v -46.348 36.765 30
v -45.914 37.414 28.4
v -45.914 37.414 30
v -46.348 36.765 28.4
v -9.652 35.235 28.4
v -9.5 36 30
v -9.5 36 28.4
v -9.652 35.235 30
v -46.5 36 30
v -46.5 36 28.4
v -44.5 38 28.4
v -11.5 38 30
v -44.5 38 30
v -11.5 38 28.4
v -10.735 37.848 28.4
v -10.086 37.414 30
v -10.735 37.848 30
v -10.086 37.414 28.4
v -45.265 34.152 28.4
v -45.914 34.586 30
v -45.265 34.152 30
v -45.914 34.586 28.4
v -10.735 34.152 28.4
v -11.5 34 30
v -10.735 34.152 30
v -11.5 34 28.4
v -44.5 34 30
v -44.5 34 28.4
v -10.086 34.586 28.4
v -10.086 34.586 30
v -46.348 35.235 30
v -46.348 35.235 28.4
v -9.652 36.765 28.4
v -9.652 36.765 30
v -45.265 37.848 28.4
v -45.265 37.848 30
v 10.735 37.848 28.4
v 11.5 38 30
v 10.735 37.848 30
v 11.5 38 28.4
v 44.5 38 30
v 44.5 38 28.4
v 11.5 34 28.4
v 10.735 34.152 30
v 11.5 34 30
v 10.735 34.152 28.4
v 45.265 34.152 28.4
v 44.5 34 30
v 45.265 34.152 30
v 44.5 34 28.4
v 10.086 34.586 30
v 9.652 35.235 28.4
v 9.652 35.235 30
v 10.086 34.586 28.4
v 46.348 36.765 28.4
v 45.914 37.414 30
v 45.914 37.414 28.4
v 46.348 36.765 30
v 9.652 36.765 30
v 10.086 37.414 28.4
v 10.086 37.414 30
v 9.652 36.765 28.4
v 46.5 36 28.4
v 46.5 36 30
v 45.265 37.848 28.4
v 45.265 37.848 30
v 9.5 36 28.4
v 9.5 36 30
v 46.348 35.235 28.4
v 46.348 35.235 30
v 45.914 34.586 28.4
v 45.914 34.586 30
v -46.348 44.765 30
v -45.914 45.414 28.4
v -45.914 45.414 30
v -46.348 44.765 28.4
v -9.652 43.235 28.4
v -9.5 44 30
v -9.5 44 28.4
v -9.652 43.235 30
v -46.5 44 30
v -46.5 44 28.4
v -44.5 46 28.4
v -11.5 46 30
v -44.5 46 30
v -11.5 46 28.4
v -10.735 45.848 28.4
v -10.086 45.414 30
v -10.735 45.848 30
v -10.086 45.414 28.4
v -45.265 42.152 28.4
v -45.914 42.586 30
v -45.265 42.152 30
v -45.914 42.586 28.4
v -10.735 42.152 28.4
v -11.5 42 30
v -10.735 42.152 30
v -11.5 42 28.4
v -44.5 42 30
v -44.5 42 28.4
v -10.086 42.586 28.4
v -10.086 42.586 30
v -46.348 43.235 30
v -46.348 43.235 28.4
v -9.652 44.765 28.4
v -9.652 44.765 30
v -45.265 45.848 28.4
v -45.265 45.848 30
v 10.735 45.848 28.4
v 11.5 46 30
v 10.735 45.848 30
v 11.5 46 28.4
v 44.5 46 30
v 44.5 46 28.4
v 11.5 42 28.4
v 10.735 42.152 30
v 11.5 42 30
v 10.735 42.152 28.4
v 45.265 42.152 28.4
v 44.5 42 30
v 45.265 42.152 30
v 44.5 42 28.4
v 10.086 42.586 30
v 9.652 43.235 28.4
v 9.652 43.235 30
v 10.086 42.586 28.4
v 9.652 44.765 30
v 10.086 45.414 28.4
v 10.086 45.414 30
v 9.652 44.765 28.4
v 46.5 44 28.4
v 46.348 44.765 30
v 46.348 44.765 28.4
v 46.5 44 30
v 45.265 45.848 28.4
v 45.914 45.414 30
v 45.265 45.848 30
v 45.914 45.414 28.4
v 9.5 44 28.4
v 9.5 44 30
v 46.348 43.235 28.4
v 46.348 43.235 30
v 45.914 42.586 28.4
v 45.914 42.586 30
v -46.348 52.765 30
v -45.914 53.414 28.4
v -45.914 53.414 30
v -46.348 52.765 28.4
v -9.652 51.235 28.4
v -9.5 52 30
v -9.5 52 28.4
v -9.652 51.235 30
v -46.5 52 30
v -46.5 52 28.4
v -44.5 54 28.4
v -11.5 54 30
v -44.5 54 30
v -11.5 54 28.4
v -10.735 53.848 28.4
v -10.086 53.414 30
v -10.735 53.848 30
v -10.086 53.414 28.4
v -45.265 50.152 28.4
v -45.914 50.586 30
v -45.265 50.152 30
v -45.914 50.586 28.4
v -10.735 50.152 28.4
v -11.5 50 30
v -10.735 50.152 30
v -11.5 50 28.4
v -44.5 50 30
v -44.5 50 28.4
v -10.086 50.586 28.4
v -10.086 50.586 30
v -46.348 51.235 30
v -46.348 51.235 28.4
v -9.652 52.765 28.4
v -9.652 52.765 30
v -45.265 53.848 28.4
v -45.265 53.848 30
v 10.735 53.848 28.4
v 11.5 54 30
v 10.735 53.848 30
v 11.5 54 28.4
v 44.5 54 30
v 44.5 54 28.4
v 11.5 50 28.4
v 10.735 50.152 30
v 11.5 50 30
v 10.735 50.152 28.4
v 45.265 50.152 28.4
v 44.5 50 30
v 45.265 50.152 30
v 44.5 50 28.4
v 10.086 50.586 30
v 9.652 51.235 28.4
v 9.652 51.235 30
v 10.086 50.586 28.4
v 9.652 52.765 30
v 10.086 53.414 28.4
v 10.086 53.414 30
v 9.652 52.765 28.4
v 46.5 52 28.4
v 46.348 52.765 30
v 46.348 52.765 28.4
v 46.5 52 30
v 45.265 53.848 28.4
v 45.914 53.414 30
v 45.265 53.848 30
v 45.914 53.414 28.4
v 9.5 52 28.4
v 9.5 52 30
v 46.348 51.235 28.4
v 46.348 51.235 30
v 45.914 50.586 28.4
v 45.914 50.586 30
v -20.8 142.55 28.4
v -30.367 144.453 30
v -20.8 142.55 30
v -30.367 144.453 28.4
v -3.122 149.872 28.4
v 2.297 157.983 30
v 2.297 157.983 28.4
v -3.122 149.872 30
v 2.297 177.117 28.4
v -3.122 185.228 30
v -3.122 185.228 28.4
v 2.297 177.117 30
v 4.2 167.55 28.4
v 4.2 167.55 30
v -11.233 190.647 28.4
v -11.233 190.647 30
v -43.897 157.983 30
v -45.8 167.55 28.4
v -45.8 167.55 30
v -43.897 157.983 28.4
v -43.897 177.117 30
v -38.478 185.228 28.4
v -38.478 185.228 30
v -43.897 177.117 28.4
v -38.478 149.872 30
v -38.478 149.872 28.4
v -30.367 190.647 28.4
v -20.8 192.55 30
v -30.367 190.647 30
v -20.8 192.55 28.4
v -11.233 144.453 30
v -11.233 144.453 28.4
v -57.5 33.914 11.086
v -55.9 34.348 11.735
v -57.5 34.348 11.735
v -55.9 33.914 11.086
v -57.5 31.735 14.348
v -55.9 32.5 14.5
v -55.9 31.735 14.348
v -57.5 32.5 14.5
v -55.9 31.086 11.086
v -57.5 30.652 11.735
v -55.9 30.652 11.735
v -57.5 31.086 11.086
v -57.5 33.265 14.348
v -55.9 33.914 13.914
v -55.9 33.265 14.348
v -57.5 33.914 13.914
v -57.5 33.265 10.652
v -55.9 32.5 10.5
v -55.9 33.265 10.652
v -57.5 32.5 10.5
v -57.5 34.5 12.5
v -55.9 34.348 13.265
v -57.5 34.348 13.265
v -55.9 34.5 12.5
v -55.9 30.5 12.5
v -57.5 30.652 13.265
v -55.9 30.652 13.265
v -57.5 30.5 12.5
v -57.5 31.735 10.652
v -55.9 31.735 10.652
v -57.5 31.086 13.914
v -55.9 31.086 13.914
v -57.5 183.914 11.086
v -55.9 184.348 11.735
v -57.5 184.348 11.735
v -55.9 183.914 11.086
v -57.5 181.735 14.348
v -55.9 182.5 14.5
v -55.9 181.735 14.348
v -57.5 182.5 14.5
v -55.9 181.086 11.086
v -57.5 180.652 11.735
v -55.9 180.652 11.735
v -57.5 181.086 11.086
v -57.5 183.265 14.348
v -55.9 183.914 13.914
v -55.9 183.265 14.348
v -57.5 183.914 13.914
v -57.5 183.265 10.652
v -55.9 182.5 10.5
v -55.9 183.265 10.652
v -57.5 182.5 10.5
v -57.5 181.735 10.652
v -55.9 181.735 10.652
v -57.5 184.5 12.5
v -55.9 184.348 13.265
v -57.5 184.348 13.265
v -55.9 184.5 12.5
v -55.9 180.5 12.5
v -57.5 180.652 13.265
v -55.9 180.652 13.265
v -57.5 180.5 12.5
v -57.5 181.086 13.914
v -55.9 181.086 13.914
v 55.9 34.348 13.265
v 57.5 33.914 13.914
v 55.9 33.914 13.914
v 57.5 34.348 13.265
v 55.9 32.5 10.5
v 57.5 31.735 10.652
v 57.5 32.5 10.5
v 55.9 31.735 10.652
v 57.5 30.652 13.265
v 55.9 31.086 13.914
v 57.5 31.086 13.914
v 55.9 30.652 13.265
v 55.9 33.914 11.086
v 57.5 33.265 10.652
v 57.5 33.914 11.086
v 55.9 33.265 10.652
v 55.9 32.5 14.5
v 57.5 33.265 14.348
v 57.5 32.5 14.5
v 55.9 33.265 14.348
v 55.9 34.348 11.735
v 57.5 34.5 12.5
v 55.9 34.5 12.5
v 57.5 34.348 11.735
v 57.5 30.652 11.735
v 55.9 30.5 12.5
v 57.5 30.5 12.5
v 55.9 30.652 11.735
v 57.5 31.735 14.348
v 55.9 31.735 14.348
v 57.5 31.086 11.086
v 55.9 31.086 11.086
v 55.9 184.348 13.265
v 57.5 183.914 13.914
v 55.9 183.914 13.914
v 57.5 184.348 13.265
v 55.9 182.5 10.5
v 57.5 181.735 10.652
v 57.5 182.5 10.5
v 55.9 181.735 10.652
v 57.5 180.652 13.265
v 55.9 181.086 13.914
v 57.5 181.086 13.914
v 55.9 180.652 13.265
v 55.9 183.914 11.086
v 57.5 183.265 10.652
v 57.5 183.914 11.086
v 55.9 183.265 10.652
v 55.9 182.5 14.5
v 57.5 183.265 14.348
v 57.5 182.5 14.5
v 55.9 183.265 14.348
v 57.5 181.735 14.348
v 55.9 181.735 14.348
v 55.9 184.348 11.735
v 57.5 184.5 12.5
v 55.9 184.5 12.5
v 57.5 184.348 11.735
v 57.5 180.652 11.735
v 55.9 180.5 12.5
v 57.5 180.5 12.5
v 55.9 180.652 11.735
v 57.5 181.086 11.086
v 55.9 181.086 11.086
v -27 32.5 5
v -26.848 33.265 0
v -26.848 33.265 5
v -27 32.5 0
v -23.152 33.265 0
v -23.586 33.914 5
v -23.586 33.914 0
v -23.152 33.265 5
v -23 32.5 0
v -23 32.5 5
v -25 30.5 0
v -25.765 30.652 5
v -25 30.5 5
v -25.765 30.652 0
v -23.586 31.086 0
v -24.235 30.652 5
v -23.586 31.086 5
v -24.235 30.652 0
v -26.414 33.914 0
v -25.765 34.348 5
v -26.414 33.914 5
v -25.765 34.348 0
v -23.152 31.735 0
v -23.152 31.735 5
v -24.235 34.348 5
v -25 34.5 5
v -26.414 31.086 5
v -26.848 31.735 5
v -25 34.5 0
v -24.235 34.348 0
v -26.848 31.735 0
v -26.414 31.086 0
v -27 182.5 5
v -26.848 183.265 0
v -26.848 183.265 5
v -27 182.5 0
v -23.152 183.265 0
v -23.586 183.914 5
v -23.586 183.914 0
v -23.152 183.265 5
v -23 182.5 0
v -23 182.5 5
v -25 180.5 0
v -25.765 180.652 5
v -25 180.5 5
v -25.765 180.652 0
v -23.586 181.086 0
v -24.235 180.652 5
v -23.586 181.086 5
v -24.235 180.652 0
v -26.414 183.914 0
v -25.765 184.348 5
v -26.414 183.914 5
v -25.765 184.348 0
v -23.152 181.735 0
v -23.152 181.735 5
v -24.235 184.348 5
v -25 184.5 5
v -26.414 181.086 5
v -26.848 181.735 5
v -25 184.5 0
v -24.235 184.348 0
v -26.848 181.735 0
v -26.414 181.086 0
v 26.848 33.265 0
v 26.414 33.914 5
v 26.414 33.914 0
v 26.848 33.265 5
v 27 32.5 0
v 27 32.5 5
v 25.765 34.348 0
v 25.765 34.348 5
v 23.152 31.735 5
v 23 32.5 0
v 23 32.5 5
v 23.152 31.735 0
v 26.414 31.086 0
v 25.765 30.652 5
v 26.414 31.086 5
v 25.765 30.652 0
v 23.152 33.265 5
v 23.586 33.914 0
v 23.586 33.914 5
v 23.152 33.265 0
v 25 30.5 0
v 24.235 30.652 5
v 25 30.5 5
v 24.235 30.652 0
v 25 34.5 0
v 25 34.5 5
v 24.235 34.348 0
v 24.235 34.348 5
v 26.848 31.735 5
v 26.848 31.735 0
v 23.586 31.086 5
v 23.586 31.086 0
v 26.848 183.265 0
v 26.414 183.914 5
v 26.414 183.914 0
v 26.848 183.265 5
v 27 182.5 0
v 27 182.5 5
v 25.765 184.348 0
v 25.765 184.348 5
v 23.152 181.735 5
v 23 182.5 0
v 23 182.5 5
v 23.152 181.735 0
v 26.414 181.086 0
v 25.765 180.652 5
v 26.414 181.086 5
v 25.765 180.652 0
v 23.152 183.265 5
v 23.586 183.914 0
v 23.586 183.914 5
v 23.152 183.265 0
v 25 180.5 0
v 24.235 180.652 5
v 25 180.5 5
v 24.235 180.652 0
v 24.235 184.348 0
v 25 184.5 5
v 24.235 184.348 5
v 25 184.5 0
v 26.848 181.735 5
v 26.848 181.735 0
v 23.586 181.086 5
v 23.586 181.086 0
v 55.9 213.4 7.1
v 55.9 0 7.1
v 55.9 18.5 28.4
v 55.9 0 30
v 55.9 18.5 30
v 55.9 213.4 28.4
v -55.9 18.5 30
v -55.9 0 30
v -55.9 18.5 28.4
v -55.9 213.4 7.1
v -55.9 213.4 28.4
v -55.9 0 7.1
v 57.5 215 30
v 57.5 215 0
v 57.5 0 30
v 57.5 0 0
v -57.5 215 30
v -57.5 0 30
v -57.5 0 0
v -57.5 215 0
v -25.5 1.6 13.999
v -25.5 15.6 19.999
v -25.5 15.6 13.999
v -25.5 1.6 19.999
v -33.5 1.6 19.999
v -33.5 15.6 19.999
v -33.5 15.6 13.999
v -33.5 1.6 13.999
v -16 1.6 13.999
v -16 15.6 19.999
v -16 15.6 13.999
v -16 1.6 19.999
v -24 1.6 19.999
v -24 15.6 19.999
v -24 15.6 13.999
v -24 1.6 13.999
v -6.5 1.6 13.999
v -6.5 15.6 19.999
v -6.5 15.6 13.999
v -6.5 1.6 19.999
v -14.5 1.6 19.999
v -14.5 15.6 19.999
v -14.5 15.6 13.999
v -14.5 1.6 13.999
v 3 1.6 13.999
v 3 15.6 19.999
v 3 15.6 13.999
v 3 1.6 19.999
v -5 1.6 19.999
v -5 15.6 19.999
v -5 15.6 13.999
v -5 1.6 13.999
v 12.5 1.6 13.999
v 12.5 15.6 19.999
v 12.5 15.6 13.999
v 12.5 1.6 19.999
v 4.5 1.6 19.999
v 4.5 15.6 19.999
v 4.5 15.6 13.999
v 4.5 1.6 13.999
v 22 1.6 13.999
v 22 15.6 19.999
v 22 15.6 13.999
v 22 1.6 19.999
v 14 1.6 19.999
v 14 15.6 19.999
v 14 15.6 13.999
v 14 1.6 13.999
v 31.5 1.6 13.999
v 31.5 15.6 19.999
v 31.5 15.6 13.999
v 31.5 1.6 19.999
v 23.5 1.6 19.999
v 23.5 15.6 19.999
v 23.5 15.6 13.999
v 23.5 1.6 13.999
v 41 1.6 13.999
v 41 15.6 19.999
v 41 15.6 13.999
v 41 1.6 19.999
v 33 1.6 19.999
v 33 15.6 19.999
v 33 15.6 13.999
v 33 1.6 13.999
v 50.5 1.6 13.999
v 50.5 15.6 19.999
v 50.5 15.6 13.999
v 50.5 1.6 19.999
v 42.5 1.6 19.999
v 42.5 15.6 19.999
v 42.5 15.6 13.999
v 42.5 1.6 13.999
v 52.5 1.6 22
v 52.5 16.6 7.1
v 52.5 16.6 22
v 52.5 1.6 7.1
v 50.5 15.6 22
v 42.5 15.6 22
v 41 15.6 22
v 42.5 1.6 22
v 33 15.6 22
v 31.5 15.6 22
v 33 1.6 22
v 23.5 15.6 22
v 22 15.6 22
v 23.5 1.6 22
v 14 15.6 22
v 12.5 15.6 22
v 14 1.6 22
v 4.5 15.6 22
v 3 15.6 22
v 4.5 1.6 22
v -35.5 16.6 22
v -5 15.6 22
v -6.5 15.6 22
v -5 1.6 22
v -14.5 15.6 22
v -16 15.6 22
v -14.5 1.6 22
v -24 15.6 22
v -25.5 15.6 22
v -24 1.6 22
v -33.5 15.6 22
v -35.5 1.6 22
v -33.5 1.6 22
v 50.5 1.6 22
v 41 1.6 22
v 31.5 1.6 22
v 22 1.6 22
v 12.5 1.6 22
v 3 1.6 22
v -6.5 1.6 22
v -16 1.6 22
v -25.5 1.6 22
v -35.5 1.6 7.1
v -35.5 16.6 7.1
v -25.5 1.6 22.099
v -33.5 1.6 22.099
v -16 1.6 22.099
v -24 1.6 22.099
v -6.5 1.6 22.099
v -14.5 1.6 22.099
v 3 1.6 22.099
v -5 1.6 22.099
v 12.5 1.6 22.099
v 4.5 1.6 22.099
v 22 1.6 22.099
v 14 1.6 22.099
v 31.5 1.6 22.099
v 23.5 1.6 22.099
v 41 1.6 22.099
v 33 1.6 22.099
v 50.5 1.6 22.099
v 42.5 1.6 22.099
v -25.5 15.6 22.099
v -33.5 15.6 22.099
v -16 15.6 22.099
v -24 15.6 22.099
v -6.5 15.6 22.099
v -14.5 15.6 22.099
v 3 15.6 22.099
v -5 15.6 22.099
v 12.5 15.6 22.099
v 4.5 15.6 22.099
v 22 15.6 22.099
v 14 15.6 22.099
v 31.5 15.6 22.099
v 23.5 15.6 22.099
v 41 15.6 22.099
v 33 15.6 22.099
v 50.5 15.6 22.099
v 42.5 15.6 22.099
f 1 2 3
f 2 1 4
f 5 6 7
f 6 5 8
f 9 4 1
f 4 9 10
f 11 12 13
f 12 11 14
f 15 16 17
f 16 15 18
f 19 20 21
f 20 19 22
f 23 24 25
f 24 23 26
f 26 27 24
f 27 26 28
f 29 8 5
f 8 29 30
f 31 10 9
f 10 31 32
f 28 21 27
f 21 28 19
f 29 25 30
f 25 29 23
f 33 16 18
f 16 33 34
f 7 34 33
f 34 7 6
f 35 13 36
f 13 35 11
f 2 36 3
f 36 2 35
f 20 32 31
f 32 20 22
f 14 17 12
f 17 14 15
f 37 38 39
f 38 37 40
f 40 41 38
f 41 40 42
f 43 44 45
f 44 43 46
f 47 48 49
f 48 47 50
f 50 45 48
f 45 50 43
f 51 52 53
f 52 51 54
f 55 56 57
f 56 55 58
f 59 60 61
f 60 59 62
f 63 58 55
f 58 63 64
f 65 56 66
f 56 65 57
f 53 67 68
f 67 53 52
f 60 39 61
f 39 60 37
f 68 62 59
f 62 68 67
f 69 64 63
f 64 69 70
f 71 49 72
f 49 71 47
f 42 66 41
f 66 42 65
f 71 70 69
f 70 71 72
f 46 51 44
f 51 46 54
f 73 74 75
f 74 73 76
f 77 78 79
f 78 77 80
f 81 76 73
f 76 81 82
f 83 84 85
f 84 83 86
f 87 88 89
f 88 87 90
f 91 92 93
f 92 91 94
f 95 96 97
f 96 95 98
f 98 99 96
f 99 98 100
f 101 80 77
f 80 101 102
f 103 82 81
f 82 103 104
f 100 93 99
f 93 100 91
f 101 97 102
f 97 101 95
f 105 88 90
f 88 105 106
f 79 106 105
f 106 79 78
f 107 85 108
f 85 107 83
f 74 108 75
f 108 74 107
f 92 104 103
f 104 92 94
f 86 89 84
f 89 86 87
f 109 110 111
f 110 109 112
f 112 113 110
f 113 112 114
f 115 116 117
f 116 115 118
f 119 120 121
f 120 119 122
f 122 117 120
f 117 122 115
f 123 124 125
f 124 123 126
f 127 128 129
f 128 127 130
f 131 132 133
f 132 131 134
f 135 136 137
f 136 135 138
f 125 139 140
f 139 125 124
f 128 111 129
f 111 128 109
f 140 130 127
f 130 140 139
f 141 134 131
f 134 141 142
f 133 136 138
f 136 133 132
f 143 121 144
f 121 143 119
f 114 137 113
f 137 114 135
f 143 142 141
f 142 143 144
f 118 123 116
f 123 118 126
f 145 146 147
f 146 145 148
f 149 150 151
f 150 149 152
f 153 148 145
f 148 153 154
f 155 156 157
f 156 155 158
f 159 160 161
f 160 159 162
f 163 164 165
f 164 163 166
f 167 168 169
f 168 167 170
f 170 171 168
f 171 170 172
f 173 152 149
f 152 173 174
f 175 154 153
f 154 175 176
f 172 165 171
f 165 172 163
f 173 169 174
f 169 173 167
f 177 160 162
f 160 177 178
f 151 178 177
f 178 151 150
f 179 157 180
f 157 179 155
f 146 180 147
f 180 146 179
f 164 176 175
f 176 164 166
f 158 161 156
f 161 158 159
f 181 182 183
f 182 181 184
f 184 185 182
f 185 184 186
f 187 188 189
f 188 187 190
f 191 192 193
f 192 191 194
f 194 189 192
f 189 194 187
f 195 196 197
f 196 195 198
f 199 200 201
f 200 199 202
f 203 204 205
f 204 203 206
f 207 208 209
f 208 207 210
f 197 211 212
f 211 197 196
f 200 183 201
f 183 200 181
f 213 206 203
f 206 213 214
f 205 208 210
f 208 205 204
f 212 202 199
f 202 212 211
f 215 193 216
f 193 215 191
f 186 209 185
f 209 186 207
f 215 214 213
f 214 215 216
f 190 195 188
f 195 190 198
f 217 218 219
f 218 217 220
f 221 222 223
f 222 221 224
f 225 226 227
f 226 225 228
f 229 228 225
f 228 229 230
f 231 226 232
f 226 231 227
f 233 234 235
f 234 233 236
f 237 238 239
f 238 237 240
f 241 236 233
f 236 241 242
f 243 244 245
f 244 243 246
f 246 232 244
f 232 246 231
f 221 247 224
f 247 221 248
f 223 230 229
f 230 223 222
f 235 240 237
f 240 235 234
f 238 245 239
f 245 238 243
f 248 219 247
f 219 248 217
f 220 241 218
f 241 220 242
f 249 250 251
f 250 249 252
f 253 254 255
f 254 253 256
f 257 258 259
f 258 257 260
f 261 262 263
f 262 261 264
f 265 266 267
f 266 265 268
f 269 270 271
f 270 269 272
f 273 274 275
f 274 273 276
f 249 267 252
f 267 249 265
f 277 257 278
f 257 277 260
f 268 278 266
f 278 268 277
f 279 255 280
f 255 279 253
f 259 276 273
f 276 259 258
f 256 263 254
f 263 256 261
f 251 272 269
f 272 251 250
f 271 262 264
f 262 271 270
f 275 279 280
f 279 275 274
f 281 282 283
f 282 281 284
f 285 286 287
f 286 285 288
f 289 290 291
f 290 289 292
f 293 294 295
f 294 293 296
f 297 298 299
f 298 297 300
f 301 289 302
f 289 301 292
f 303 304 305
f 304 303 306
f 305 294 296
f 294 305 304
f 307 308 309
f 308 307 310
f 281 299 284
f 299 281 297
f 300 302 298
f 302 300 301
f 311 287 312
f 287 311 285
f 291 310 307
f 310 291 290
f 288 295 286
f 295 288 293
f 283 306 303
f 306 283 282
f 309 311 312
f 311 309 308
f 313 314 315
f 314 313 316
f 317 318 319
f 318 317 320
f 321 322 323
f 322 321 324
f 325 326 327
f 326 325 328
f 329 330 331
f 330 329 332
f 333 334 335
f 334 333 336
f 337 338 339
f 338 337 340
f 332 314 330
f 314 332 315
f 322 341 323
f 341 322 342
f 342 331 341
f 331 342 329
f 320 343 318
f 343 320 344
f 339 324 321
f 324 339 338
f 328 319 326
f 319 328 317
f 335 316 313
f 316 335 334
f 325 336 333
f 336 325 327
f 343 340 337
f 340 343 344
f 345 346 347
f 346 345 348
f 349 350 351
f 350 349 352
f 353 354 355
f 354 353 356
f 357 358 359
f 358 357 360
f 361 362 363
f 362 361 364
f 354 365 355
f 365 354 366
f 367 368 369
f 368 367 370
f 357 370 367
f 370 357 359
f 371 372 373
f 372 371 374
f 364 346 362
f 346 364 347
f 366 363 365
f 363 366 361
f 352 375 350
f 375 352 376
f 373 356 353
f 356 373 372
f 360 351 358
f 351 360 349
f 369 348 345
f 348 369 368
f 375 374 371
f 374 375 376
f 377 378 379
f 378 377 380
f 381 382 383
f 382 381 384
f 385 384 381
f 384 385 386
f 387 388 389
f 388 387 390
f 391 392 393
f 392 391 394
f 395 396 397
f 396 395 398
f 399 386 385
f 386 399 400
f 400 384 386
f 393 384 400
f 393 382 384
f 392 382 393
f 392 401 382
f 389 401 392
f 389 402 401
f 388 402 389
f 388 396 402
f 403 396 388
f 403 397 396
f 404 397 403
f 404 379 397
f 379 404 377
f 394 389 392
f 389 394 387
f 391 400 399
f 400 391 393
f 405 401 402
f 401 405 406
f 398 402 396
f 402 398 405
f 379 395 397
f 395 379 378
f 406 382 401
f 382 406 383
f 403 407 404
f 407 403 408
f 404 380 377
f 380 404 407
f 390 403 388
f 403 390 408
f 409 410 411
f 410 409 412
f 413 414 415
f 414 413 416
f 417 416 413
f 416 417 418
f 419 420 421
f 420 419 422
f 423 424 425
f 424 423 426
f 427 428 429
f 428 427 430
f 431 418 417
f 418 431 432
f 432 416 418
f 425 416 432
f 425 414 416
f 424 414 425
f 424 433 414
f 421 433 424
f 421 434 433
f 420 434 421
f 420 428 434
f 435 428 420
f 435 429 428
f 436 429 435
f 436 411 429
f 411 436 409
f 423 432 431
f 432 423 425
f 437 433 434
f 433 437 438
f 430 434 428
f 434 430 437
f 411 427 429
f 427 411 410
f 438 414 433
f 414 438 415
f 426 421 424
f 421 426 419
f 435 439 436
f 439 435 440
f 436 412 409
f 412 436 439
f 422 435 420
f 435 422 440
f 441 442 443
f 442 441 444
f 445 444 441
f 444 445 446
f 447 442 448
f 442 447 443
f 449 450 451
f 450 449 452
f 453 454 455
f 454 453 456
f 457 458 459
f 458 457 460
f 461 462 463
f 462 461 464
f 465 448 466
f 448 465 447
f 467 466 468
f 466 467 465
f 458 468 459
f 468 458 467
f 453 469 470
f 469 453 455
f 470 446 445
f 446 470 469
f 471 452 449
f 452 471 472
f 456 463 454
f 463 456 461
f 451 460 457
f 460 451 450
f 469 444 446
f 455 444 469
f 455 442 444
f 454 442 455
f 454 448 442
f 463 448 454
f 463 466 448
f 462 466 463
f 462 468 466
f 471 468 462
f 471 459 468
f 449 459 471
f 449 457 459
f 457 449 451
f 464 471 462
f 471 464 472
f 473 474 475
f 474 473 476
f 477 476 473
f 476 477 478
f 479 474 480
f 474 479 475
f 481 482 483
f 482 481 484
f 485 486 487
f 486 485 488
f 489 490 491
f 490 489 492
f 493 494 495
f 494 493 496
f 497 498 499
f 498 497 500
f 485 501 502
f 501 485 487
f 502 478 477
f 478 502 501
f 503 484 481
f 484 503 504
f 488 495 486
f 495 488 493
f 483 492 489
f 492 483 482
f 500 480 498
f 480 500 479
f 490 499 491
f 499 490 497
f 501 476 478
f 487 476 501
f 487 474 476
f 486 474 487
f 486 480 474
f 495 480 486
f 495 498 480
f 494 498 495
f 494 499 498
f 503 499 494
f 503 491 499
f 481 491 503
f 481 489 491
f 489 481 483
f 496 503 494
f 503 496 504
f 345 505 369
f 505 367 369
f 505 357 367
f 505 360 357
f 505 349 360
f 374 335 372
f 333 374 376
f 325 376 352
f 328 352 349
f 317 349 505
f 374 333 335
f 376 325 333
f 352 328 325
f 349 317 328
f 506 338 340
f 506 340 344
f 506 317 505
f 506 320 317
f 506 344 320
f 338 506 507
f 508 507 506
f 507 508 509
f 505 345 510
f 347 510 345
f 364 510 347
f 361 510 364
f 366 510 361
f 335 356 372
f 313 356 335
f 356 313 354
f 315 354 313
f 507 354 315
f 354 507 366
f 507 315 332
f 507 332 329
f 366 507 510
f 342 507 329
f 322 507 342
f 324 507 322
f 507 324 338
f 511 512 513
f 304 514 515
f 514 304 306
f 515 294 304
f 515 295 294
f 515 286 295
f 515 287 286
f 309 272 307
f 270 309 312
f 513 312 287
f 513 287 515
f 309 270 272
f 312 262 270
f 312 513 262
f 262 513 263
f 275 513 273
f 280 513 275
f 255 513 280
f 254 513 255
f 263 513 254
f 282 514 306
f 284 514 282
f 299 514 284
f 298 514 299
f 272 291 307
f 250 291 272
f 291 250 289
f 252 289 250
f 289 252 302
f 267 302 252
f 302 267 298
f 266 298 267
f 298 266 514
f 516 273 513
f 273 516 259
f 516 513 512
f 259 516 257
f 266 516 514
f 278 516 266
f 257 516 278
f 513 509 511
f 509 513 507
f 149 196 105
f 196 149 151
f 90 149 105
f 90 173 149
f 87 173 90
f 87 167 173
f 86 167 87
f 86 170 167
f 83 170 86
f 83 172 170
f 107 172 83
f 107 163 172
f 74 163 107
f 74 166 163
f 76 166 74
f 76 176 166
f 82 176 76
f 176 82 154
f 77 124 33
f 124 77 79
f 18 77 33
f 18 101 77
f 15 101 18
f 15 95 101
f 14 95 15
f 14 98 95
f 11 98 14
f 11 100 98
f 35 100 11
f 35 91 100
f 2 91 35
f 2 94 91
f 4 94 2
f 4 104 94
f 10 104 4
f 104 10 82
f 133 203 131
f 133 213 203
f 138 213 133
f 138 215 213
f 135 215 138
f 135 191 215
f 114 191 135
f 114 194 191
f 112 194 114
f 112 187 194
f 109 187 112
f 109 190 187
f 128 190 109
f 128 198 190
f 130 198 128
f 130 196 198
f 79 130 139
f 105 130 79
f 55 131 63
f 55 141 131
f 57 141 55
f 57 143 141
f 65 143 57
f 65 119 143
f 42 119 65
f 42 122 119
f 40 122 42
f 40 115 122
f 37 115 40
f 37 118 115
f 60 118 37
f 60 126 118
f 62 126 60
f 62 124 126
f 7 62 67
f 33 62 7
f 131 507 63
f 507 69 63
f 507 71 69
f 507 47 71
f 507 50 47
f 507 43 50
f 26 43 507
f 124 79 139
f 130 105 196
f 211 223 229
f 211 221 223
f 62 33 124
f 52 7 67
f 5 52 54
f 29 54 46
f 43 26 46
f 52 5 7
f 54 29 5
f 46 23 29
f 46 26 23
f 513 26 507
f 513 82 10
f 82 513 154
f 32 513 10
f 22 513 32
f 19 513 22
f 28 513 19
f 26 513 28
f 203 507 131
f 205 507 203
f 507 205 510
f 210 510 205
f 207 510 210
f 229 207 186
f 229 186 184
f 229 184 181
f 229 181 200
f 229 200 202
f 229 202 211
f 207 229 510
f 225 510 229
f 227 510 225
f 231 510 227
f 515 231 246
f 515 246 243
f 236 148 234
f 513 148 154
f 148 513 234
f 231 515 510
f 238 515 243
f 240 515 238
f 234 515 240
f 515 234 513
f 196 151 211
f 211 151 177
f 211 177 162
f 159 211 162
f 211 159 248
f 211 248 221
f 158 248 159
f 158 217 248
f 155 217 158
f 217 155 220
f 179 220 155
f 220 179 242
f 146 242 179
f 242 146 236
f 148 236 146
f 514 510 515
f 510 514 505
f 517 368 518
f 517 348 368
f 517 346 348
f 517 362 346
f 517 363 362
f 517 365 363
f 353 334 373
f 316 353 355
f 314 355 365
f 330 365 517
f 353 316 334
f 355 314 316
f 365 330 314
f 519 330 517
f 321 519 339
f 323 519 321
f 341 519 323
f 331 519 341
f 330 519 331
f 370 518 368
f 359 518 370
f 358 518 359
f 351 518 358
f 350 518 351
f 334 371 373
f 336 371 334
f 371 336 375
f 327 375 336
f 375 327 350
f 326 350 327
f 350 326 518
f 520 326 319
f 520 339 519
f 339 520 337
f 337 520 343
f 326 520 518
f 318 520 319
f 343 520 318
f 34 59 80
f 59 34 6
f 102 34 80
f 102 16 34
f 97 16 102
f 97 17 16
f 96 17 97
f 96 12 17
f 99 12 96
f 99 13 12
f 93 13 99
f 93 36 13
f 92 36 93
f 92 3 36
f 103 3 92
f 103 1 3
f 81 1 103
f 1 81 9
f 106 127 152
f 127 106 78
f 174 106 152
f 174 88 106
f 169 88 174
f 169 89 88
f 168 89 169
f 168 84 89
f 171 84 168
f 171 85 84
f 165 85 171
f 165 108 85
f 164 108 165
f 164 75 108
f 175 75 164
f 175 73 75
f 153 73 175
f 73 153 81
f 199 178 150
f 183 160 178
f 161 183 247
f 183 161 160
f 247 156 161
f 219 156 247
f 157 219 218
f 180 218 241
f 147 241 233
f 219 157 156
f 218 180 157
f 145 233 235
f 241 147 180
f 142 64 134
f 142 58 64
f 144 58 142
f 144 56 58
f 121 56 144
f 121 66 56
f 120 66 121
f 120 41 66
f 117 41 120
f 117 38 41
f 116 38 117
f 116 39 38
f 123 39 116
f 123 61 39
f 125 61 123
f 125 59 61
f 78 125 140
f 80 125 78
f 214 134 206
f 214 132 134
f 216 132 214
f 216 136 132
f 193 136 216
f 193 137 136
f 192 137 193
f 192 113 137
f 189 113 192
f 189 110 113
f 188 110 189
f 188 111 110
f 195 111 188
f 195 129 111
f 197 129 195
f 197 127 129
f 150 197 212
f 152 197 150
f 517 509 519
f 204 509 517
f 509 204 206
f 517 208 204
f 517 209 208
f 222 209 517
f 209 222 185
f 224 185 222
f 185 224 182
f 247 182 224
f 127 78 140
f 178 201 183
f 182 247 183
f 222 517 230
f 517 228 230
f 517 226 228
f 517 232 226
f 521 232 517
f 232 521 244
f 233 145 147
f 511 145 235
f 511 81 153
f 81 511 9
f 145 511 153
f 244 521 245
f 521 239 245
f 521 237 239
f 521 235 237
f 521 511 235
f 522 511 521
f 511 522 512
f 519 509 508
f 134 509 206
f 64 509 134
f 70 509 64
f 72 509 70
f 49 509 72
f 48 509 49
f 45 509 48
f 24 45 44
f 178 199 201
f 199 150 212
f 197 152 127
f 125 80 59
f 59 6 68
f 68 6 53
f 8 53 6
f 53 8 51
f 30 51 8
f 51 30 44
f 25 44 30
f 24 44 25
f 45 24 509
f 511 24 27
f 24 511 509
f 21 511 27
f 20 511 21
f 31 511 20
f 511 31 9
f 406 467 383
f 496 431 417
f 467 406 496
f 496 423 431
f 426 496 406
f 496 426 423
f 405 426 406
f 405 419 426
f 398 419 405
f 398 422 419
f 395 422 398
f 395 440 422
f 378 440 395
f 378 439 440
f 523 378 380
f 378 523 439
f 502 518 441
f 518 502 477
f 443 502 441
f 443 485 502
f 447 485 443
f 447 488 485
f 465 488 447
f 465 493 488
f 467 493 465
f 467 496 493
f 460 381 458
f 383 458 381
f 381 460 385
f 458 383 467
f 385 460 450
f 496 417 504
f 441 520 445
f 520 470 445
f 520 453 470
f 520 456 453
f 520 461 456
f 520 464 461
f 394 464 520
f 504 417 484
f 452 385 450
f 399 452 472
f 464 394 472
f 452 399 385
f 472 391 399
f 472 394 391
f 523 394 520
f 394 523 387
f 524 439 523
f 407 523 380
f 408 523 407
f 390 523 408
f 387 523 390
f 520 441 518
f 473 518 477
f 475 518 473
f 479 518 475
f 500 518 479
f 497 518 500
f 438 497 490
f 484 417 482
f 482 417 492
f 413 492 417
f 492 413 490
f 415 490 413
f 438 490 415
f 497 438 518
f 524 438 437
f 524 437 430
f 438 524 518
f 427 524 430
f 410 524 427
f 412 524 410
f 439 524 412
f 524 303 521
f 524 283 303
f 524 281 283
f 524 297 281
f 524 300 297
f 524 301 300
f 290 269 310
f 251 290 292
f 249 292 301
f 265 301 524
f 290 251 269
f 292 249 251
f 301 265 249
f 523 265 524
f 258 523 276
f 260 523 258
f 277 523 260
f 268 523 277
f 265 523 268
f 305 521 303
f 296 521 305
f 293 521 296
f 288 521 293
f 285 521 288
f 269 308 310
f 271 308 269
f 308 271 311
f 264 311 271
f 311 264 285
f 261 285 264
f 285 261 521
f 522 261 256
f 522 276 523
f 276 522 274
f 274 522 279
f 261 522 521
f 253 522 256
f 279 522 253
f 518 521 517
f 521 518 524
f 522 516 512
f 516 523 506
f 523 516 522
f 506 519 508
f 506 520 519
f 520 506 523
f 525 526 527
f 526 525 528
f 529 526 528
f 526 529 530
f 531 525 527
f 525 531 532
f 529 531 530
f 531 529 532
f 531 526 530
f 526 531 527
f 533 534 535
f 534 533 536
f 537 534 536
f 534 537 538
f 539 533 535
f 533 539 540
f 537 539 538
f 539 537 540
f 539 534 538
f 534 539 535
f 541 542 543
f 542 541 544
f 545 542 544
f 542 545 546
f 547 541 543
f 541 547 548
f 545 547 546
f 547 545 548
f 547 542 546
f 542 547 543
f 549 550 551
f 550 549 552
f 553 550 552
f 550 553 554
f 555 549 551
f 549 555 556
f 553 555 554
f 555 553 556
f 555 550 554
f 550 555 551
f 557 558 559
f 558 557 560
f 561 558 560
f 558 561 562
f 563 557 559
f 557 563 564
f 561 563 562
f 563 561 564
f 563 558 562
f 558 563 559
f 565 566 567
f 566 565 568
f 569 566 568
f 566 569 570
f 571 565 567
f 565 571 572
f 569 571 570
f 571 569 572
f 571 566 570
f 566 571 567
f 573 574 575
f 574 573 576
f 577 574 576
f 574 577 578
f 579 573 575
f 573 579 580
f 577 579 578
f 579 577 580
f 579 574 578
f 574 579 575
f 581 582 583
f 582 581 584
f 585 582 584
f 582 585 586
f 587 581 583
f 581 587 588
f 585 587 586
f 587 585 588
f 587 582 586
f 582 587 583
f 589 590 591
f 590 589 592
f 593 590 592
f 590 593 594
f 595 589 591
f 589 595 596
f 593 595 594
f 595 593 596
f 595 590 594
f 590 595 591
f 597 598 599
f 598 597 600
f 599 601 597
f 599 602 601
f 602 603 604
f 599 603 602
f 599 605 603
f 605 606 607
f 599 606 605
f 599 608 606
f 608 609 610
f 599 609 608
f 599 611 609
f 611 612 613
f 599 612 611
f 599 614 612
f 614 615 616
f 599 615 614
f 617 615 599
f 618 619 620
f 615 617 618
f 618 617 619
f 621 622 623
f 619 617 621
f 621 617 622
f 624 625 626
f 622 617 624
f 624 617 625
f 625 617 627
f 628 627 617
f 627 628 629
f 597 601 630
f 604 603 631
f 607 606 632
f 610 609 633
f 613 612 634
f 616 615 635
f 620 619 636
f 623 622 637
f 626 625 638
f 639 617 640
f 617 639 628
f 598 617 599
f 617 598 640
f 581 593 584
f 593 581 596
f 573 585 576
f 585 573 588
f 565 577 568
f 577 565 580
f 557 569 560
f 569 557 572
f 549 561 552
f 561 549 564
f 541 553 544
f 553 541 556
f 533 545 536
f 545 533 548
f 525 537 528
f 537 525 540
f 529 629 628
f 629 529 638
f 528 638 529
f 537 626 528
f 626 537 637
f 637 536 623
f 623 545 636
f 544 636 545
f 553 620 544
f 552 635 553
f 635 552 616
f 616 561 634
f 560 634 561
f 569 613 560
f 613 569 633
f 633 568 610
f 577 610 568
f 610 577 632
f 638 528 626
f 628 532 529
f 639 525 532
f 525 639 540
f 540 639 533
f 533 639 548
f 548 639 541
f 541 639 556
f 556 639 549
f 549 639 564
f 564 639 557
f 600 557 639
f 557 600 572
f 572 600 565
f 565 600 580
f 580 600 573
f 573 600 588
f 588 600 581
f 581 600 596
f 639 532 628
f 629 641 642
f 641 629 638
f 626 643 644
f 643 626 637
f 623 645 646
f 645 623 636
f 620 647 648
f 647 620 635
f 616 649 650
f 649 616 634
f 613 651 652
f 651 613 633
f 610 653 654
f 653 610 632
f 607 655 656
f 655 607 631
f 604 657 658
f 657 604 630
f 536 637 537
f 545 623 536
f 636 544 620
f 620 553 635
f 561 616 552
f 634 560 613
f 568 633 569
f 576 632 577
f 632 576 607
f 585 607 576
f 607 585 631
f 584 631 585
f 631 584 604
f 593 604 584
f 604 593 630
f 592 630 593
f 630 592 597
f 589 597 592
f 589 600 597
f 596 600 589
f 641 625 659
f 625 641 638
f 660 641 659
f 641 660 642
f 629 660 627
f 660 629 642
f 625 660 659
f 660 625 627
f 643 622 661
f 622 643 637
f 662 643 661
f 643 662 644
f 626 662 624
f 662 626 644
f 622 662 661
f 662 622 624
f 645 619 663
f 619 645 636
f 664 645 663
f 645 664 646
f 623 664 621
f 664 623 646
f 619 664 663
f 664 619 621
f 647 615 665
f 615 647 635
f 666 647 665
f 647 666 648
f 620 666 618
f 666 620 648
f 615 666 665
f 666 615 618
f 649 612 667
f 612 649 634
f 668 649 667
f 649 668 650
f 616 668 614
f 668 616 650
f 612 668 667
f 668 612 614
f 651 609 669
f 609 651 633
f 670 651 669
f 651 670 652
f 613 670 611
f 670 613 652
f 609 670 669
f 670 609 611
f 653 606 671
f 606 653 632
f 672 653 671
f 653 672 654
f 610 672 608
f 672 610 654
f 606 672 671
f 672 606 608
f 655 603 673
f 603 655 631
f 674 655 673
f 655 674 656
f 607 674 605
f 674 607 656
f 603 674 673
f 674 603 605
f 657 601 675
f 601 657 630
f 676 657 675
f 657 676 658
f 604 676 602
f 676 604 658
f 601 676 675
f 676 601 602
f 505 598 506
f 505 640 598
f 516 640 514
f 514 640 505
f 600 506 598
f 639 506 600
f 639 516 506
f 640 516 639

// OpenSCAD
e=.001;
$fn=16;

mw_lrs_w=115;
mw_lrs_h=30;
mw_lrs_d=215;


mw_lrs_holes_pitch_d  = 150;
mw_lrs_holes_pitch_w  = 50;
mw_lrs_holes_height_h = 12.5;

mw_lrs_gap_h = 23;
mw_lrs_gap_d = 18.5;

mw_lrs_case_thickness = 1.6;

m4_thread = 4;

mw_lrs_screw_terminal_x=8.5;
mw_lrs_screw_terminal_w=88;
mw_lrs_screw_terminal_d=15;
mw_lrs_screw_terminal_h=15;
mw_lrs_screw_terminal_pitch = 9.5;
mw_lrs_screw_terminal_gap_w = 8;
mw_lrs_screw_terminal_gap_d = 14;
mw_lrs_screw_terminal_gap_z = 7;
mw_lrs_screw_terminal_gap_h = 6;

module mw_lrs_side_holes()
{
	translate( [0, 0, mw_lrs_holes_height_h] )
	for( r = [ 0, 180 ] )
	rotate( [0, r, 0] )
	for( y = [ (mw_lrs_d-mw_lrs_holes_pitch_d)/2, (mw_lrs_d+mw_lrs_holes_pitch_d)/2 ] )
	translate( [-mw_lrs_w/2, y, 0] )
	rotate( [0, 90, 0] )
	children();
}

module mw_lrs_bottom_holes()
{
	for( x = [ -mw_lrs_holes_pitch_w/2, mw_lrs_holes_pitch_w/2 ] )
	for( y = [ (mw_lrs_d-mw_lrs_holes_pitch_d)/2, (mw_lrs_d+mw_lrs_holes_pitch_d)/2 ] )
	translate( [x, y, 0] )
	children();
}

module mw_lrs_holes()
{
	mw_lrs_side_holes() children();
	mw_lrs_bottom_holes() children();
}

module mw_lrs_screw_terminal()
{
	colors = [
		"red", "red", "red",
		"black", "black", "black",
		"green", "blue", "brown",
	];
	b=1;
	translate([mw_lrs_screw_terminal_x, mw_lrs_case_thickness, mw_lrs_h-mw_lrs_gap_h-e])
	{
		difference()
		{
			translate([-mw_lrs_screw_terminal_w/2, 0, 0])
			cube([mw_lrs_screw_terminal_w, mw_lrs_screw_terminal_d, mw_lrs_screw_terminal_h+e]);
			for (i=[0:8])
			translate([(i-4)*9.5-mw_lrs_screw_terminal_gap_w/2, -b, mw_lrs_screw_terminal_gap_z])
			cube([mw_lrs_screw_terminal_gap_w, mw_lrs_screw_terminal_gap_d+b, mw_lrs_screw_terminal_gap_h]);
		}

		for (i=[0:8])
		translate([(i-4)*9.5-mw_lrs_screw_terminal_gap_w/2, -0, mw_lrs_screw_terminal_h])
		color(colors[i])
		cube([mw_lrs_screw_terminal_gap_w,mw_lrs_screw_terminal_gap_d,.1]);

	}
}

module mw_lrs_vents()
{
	b=1;
	hole=4;
	for (y = [36, 44, 52])
	for (i = [-1, 1])
	hull()
	{
		translate([i*(19/2+hole/2), y, mw_lrs_h-mw_lrs_case_thickness-b])
			cylinder(mw_lrs_case_thickness+2*b, r=hole/2);

		translate([i*(19/2+hole/2+33), y, mw_lrs_h-mw_lrs_case_thickness-b])
			cylinder(mw_lrs_case_thickness+2*b, r=hole/2);
	}

	translate([-mw_lrs_w/2+36.7, mw_lrs_d-47.45,mw_lrs_h-mw_lrs_case_thickness-b])
		cylinder(mw_lrs_case_thickness+2*b, r=50/2);
}

module mw_lrs_vents_keepout(h, margin=0)
{
	b=1;
	hole=4;
	hull()
	for (y = [36, 44, 52])
	for (i = [-1, 1])
	{
		translate([i*(19/2+hole/2), y, mw_lrs_h-b])
			cylinder(h+b, r=hole/2+margin);

		translate([i*(19/2+hole/2+33), y, mw_lrs_h-b])
			cylinder(h+b, r=hole/2+margin);
	}

	translate([-mw_lrs_w/2+36.7, mw_lrs_d-47.45,mw_lrs_h-b])
		cylinder(h+b, r=50/2);
}

module mw_lrs()
{
	b=1; 

	union()
	{
		color([.75,.75,.75])
		difference()
		{

			translate([-mw_lrs_w/2,0,0])
			cube([mw_lrs_w, mw_lrs_d, mw_lrs_h]);

			union()
			{
				translate([-mw_lrs_w/2+mw_lrs_case_thickness, -b, mw_lrs_h-mw_lrs_gap_h] )
				cube( [ mw_lrs_w-2*mw_lrs_case_thickness, b+mw_lrs_gap_d, mw_lrs_gap_h+b] );

				translate([-mw_lrs_w/2+mw_lrs_case_thickness, mw_lrs_gap_d-e, mw_lrs_h-mw_lrs_gap_h] )
				cube( [ mw_lrs_w-2*mw_lrs_case_thickness, mw_lrs_d-mw_lrs_gap_d+e-mw_lrs_case_thickness, mw_lrs_gap_h-mw_lrs_case_thickness] );

				mw_lrs_vents();

				mw_lrs_holes()
				{
					translate([0,0,-e])
					cylinder(h=5+e, r=m4_thread/2);
				}
			}
		}
		color([.1, .3, .1])
		translate([-mw_lrs_w/2+mw_lrs_case_thickness, 0, mw_lrs_h-mw_lrs_gap_h-e])
		cube([mw_lrs_w-2*mw_lrs_case_thickness, mw_lrs_d-mw_lrs_case_thickness, e+.1]);
		mw_lrs_screw_terminal();
	}
}

module mw_lrs_keepout(margin=0, e=0)
{
	b=1; 

	w=mw_lrs_w+margin*2;
	d=mw_lrs_d+margin*2;
	h=mw_lrs_h+margin*2;

	translate([-w/2,-margin,-margin])
	cube([w, d, h]);
}

mw_lrs();
%mw_lrs_keepout(margin=.4);

module m4_hole(h, margin=0)
{
	translate([0,0,-h])
	cylinder(h=h+e, r=(m4_thread+margin)/2);
}

%mw_lrs_holes()
m4_hole(10);
